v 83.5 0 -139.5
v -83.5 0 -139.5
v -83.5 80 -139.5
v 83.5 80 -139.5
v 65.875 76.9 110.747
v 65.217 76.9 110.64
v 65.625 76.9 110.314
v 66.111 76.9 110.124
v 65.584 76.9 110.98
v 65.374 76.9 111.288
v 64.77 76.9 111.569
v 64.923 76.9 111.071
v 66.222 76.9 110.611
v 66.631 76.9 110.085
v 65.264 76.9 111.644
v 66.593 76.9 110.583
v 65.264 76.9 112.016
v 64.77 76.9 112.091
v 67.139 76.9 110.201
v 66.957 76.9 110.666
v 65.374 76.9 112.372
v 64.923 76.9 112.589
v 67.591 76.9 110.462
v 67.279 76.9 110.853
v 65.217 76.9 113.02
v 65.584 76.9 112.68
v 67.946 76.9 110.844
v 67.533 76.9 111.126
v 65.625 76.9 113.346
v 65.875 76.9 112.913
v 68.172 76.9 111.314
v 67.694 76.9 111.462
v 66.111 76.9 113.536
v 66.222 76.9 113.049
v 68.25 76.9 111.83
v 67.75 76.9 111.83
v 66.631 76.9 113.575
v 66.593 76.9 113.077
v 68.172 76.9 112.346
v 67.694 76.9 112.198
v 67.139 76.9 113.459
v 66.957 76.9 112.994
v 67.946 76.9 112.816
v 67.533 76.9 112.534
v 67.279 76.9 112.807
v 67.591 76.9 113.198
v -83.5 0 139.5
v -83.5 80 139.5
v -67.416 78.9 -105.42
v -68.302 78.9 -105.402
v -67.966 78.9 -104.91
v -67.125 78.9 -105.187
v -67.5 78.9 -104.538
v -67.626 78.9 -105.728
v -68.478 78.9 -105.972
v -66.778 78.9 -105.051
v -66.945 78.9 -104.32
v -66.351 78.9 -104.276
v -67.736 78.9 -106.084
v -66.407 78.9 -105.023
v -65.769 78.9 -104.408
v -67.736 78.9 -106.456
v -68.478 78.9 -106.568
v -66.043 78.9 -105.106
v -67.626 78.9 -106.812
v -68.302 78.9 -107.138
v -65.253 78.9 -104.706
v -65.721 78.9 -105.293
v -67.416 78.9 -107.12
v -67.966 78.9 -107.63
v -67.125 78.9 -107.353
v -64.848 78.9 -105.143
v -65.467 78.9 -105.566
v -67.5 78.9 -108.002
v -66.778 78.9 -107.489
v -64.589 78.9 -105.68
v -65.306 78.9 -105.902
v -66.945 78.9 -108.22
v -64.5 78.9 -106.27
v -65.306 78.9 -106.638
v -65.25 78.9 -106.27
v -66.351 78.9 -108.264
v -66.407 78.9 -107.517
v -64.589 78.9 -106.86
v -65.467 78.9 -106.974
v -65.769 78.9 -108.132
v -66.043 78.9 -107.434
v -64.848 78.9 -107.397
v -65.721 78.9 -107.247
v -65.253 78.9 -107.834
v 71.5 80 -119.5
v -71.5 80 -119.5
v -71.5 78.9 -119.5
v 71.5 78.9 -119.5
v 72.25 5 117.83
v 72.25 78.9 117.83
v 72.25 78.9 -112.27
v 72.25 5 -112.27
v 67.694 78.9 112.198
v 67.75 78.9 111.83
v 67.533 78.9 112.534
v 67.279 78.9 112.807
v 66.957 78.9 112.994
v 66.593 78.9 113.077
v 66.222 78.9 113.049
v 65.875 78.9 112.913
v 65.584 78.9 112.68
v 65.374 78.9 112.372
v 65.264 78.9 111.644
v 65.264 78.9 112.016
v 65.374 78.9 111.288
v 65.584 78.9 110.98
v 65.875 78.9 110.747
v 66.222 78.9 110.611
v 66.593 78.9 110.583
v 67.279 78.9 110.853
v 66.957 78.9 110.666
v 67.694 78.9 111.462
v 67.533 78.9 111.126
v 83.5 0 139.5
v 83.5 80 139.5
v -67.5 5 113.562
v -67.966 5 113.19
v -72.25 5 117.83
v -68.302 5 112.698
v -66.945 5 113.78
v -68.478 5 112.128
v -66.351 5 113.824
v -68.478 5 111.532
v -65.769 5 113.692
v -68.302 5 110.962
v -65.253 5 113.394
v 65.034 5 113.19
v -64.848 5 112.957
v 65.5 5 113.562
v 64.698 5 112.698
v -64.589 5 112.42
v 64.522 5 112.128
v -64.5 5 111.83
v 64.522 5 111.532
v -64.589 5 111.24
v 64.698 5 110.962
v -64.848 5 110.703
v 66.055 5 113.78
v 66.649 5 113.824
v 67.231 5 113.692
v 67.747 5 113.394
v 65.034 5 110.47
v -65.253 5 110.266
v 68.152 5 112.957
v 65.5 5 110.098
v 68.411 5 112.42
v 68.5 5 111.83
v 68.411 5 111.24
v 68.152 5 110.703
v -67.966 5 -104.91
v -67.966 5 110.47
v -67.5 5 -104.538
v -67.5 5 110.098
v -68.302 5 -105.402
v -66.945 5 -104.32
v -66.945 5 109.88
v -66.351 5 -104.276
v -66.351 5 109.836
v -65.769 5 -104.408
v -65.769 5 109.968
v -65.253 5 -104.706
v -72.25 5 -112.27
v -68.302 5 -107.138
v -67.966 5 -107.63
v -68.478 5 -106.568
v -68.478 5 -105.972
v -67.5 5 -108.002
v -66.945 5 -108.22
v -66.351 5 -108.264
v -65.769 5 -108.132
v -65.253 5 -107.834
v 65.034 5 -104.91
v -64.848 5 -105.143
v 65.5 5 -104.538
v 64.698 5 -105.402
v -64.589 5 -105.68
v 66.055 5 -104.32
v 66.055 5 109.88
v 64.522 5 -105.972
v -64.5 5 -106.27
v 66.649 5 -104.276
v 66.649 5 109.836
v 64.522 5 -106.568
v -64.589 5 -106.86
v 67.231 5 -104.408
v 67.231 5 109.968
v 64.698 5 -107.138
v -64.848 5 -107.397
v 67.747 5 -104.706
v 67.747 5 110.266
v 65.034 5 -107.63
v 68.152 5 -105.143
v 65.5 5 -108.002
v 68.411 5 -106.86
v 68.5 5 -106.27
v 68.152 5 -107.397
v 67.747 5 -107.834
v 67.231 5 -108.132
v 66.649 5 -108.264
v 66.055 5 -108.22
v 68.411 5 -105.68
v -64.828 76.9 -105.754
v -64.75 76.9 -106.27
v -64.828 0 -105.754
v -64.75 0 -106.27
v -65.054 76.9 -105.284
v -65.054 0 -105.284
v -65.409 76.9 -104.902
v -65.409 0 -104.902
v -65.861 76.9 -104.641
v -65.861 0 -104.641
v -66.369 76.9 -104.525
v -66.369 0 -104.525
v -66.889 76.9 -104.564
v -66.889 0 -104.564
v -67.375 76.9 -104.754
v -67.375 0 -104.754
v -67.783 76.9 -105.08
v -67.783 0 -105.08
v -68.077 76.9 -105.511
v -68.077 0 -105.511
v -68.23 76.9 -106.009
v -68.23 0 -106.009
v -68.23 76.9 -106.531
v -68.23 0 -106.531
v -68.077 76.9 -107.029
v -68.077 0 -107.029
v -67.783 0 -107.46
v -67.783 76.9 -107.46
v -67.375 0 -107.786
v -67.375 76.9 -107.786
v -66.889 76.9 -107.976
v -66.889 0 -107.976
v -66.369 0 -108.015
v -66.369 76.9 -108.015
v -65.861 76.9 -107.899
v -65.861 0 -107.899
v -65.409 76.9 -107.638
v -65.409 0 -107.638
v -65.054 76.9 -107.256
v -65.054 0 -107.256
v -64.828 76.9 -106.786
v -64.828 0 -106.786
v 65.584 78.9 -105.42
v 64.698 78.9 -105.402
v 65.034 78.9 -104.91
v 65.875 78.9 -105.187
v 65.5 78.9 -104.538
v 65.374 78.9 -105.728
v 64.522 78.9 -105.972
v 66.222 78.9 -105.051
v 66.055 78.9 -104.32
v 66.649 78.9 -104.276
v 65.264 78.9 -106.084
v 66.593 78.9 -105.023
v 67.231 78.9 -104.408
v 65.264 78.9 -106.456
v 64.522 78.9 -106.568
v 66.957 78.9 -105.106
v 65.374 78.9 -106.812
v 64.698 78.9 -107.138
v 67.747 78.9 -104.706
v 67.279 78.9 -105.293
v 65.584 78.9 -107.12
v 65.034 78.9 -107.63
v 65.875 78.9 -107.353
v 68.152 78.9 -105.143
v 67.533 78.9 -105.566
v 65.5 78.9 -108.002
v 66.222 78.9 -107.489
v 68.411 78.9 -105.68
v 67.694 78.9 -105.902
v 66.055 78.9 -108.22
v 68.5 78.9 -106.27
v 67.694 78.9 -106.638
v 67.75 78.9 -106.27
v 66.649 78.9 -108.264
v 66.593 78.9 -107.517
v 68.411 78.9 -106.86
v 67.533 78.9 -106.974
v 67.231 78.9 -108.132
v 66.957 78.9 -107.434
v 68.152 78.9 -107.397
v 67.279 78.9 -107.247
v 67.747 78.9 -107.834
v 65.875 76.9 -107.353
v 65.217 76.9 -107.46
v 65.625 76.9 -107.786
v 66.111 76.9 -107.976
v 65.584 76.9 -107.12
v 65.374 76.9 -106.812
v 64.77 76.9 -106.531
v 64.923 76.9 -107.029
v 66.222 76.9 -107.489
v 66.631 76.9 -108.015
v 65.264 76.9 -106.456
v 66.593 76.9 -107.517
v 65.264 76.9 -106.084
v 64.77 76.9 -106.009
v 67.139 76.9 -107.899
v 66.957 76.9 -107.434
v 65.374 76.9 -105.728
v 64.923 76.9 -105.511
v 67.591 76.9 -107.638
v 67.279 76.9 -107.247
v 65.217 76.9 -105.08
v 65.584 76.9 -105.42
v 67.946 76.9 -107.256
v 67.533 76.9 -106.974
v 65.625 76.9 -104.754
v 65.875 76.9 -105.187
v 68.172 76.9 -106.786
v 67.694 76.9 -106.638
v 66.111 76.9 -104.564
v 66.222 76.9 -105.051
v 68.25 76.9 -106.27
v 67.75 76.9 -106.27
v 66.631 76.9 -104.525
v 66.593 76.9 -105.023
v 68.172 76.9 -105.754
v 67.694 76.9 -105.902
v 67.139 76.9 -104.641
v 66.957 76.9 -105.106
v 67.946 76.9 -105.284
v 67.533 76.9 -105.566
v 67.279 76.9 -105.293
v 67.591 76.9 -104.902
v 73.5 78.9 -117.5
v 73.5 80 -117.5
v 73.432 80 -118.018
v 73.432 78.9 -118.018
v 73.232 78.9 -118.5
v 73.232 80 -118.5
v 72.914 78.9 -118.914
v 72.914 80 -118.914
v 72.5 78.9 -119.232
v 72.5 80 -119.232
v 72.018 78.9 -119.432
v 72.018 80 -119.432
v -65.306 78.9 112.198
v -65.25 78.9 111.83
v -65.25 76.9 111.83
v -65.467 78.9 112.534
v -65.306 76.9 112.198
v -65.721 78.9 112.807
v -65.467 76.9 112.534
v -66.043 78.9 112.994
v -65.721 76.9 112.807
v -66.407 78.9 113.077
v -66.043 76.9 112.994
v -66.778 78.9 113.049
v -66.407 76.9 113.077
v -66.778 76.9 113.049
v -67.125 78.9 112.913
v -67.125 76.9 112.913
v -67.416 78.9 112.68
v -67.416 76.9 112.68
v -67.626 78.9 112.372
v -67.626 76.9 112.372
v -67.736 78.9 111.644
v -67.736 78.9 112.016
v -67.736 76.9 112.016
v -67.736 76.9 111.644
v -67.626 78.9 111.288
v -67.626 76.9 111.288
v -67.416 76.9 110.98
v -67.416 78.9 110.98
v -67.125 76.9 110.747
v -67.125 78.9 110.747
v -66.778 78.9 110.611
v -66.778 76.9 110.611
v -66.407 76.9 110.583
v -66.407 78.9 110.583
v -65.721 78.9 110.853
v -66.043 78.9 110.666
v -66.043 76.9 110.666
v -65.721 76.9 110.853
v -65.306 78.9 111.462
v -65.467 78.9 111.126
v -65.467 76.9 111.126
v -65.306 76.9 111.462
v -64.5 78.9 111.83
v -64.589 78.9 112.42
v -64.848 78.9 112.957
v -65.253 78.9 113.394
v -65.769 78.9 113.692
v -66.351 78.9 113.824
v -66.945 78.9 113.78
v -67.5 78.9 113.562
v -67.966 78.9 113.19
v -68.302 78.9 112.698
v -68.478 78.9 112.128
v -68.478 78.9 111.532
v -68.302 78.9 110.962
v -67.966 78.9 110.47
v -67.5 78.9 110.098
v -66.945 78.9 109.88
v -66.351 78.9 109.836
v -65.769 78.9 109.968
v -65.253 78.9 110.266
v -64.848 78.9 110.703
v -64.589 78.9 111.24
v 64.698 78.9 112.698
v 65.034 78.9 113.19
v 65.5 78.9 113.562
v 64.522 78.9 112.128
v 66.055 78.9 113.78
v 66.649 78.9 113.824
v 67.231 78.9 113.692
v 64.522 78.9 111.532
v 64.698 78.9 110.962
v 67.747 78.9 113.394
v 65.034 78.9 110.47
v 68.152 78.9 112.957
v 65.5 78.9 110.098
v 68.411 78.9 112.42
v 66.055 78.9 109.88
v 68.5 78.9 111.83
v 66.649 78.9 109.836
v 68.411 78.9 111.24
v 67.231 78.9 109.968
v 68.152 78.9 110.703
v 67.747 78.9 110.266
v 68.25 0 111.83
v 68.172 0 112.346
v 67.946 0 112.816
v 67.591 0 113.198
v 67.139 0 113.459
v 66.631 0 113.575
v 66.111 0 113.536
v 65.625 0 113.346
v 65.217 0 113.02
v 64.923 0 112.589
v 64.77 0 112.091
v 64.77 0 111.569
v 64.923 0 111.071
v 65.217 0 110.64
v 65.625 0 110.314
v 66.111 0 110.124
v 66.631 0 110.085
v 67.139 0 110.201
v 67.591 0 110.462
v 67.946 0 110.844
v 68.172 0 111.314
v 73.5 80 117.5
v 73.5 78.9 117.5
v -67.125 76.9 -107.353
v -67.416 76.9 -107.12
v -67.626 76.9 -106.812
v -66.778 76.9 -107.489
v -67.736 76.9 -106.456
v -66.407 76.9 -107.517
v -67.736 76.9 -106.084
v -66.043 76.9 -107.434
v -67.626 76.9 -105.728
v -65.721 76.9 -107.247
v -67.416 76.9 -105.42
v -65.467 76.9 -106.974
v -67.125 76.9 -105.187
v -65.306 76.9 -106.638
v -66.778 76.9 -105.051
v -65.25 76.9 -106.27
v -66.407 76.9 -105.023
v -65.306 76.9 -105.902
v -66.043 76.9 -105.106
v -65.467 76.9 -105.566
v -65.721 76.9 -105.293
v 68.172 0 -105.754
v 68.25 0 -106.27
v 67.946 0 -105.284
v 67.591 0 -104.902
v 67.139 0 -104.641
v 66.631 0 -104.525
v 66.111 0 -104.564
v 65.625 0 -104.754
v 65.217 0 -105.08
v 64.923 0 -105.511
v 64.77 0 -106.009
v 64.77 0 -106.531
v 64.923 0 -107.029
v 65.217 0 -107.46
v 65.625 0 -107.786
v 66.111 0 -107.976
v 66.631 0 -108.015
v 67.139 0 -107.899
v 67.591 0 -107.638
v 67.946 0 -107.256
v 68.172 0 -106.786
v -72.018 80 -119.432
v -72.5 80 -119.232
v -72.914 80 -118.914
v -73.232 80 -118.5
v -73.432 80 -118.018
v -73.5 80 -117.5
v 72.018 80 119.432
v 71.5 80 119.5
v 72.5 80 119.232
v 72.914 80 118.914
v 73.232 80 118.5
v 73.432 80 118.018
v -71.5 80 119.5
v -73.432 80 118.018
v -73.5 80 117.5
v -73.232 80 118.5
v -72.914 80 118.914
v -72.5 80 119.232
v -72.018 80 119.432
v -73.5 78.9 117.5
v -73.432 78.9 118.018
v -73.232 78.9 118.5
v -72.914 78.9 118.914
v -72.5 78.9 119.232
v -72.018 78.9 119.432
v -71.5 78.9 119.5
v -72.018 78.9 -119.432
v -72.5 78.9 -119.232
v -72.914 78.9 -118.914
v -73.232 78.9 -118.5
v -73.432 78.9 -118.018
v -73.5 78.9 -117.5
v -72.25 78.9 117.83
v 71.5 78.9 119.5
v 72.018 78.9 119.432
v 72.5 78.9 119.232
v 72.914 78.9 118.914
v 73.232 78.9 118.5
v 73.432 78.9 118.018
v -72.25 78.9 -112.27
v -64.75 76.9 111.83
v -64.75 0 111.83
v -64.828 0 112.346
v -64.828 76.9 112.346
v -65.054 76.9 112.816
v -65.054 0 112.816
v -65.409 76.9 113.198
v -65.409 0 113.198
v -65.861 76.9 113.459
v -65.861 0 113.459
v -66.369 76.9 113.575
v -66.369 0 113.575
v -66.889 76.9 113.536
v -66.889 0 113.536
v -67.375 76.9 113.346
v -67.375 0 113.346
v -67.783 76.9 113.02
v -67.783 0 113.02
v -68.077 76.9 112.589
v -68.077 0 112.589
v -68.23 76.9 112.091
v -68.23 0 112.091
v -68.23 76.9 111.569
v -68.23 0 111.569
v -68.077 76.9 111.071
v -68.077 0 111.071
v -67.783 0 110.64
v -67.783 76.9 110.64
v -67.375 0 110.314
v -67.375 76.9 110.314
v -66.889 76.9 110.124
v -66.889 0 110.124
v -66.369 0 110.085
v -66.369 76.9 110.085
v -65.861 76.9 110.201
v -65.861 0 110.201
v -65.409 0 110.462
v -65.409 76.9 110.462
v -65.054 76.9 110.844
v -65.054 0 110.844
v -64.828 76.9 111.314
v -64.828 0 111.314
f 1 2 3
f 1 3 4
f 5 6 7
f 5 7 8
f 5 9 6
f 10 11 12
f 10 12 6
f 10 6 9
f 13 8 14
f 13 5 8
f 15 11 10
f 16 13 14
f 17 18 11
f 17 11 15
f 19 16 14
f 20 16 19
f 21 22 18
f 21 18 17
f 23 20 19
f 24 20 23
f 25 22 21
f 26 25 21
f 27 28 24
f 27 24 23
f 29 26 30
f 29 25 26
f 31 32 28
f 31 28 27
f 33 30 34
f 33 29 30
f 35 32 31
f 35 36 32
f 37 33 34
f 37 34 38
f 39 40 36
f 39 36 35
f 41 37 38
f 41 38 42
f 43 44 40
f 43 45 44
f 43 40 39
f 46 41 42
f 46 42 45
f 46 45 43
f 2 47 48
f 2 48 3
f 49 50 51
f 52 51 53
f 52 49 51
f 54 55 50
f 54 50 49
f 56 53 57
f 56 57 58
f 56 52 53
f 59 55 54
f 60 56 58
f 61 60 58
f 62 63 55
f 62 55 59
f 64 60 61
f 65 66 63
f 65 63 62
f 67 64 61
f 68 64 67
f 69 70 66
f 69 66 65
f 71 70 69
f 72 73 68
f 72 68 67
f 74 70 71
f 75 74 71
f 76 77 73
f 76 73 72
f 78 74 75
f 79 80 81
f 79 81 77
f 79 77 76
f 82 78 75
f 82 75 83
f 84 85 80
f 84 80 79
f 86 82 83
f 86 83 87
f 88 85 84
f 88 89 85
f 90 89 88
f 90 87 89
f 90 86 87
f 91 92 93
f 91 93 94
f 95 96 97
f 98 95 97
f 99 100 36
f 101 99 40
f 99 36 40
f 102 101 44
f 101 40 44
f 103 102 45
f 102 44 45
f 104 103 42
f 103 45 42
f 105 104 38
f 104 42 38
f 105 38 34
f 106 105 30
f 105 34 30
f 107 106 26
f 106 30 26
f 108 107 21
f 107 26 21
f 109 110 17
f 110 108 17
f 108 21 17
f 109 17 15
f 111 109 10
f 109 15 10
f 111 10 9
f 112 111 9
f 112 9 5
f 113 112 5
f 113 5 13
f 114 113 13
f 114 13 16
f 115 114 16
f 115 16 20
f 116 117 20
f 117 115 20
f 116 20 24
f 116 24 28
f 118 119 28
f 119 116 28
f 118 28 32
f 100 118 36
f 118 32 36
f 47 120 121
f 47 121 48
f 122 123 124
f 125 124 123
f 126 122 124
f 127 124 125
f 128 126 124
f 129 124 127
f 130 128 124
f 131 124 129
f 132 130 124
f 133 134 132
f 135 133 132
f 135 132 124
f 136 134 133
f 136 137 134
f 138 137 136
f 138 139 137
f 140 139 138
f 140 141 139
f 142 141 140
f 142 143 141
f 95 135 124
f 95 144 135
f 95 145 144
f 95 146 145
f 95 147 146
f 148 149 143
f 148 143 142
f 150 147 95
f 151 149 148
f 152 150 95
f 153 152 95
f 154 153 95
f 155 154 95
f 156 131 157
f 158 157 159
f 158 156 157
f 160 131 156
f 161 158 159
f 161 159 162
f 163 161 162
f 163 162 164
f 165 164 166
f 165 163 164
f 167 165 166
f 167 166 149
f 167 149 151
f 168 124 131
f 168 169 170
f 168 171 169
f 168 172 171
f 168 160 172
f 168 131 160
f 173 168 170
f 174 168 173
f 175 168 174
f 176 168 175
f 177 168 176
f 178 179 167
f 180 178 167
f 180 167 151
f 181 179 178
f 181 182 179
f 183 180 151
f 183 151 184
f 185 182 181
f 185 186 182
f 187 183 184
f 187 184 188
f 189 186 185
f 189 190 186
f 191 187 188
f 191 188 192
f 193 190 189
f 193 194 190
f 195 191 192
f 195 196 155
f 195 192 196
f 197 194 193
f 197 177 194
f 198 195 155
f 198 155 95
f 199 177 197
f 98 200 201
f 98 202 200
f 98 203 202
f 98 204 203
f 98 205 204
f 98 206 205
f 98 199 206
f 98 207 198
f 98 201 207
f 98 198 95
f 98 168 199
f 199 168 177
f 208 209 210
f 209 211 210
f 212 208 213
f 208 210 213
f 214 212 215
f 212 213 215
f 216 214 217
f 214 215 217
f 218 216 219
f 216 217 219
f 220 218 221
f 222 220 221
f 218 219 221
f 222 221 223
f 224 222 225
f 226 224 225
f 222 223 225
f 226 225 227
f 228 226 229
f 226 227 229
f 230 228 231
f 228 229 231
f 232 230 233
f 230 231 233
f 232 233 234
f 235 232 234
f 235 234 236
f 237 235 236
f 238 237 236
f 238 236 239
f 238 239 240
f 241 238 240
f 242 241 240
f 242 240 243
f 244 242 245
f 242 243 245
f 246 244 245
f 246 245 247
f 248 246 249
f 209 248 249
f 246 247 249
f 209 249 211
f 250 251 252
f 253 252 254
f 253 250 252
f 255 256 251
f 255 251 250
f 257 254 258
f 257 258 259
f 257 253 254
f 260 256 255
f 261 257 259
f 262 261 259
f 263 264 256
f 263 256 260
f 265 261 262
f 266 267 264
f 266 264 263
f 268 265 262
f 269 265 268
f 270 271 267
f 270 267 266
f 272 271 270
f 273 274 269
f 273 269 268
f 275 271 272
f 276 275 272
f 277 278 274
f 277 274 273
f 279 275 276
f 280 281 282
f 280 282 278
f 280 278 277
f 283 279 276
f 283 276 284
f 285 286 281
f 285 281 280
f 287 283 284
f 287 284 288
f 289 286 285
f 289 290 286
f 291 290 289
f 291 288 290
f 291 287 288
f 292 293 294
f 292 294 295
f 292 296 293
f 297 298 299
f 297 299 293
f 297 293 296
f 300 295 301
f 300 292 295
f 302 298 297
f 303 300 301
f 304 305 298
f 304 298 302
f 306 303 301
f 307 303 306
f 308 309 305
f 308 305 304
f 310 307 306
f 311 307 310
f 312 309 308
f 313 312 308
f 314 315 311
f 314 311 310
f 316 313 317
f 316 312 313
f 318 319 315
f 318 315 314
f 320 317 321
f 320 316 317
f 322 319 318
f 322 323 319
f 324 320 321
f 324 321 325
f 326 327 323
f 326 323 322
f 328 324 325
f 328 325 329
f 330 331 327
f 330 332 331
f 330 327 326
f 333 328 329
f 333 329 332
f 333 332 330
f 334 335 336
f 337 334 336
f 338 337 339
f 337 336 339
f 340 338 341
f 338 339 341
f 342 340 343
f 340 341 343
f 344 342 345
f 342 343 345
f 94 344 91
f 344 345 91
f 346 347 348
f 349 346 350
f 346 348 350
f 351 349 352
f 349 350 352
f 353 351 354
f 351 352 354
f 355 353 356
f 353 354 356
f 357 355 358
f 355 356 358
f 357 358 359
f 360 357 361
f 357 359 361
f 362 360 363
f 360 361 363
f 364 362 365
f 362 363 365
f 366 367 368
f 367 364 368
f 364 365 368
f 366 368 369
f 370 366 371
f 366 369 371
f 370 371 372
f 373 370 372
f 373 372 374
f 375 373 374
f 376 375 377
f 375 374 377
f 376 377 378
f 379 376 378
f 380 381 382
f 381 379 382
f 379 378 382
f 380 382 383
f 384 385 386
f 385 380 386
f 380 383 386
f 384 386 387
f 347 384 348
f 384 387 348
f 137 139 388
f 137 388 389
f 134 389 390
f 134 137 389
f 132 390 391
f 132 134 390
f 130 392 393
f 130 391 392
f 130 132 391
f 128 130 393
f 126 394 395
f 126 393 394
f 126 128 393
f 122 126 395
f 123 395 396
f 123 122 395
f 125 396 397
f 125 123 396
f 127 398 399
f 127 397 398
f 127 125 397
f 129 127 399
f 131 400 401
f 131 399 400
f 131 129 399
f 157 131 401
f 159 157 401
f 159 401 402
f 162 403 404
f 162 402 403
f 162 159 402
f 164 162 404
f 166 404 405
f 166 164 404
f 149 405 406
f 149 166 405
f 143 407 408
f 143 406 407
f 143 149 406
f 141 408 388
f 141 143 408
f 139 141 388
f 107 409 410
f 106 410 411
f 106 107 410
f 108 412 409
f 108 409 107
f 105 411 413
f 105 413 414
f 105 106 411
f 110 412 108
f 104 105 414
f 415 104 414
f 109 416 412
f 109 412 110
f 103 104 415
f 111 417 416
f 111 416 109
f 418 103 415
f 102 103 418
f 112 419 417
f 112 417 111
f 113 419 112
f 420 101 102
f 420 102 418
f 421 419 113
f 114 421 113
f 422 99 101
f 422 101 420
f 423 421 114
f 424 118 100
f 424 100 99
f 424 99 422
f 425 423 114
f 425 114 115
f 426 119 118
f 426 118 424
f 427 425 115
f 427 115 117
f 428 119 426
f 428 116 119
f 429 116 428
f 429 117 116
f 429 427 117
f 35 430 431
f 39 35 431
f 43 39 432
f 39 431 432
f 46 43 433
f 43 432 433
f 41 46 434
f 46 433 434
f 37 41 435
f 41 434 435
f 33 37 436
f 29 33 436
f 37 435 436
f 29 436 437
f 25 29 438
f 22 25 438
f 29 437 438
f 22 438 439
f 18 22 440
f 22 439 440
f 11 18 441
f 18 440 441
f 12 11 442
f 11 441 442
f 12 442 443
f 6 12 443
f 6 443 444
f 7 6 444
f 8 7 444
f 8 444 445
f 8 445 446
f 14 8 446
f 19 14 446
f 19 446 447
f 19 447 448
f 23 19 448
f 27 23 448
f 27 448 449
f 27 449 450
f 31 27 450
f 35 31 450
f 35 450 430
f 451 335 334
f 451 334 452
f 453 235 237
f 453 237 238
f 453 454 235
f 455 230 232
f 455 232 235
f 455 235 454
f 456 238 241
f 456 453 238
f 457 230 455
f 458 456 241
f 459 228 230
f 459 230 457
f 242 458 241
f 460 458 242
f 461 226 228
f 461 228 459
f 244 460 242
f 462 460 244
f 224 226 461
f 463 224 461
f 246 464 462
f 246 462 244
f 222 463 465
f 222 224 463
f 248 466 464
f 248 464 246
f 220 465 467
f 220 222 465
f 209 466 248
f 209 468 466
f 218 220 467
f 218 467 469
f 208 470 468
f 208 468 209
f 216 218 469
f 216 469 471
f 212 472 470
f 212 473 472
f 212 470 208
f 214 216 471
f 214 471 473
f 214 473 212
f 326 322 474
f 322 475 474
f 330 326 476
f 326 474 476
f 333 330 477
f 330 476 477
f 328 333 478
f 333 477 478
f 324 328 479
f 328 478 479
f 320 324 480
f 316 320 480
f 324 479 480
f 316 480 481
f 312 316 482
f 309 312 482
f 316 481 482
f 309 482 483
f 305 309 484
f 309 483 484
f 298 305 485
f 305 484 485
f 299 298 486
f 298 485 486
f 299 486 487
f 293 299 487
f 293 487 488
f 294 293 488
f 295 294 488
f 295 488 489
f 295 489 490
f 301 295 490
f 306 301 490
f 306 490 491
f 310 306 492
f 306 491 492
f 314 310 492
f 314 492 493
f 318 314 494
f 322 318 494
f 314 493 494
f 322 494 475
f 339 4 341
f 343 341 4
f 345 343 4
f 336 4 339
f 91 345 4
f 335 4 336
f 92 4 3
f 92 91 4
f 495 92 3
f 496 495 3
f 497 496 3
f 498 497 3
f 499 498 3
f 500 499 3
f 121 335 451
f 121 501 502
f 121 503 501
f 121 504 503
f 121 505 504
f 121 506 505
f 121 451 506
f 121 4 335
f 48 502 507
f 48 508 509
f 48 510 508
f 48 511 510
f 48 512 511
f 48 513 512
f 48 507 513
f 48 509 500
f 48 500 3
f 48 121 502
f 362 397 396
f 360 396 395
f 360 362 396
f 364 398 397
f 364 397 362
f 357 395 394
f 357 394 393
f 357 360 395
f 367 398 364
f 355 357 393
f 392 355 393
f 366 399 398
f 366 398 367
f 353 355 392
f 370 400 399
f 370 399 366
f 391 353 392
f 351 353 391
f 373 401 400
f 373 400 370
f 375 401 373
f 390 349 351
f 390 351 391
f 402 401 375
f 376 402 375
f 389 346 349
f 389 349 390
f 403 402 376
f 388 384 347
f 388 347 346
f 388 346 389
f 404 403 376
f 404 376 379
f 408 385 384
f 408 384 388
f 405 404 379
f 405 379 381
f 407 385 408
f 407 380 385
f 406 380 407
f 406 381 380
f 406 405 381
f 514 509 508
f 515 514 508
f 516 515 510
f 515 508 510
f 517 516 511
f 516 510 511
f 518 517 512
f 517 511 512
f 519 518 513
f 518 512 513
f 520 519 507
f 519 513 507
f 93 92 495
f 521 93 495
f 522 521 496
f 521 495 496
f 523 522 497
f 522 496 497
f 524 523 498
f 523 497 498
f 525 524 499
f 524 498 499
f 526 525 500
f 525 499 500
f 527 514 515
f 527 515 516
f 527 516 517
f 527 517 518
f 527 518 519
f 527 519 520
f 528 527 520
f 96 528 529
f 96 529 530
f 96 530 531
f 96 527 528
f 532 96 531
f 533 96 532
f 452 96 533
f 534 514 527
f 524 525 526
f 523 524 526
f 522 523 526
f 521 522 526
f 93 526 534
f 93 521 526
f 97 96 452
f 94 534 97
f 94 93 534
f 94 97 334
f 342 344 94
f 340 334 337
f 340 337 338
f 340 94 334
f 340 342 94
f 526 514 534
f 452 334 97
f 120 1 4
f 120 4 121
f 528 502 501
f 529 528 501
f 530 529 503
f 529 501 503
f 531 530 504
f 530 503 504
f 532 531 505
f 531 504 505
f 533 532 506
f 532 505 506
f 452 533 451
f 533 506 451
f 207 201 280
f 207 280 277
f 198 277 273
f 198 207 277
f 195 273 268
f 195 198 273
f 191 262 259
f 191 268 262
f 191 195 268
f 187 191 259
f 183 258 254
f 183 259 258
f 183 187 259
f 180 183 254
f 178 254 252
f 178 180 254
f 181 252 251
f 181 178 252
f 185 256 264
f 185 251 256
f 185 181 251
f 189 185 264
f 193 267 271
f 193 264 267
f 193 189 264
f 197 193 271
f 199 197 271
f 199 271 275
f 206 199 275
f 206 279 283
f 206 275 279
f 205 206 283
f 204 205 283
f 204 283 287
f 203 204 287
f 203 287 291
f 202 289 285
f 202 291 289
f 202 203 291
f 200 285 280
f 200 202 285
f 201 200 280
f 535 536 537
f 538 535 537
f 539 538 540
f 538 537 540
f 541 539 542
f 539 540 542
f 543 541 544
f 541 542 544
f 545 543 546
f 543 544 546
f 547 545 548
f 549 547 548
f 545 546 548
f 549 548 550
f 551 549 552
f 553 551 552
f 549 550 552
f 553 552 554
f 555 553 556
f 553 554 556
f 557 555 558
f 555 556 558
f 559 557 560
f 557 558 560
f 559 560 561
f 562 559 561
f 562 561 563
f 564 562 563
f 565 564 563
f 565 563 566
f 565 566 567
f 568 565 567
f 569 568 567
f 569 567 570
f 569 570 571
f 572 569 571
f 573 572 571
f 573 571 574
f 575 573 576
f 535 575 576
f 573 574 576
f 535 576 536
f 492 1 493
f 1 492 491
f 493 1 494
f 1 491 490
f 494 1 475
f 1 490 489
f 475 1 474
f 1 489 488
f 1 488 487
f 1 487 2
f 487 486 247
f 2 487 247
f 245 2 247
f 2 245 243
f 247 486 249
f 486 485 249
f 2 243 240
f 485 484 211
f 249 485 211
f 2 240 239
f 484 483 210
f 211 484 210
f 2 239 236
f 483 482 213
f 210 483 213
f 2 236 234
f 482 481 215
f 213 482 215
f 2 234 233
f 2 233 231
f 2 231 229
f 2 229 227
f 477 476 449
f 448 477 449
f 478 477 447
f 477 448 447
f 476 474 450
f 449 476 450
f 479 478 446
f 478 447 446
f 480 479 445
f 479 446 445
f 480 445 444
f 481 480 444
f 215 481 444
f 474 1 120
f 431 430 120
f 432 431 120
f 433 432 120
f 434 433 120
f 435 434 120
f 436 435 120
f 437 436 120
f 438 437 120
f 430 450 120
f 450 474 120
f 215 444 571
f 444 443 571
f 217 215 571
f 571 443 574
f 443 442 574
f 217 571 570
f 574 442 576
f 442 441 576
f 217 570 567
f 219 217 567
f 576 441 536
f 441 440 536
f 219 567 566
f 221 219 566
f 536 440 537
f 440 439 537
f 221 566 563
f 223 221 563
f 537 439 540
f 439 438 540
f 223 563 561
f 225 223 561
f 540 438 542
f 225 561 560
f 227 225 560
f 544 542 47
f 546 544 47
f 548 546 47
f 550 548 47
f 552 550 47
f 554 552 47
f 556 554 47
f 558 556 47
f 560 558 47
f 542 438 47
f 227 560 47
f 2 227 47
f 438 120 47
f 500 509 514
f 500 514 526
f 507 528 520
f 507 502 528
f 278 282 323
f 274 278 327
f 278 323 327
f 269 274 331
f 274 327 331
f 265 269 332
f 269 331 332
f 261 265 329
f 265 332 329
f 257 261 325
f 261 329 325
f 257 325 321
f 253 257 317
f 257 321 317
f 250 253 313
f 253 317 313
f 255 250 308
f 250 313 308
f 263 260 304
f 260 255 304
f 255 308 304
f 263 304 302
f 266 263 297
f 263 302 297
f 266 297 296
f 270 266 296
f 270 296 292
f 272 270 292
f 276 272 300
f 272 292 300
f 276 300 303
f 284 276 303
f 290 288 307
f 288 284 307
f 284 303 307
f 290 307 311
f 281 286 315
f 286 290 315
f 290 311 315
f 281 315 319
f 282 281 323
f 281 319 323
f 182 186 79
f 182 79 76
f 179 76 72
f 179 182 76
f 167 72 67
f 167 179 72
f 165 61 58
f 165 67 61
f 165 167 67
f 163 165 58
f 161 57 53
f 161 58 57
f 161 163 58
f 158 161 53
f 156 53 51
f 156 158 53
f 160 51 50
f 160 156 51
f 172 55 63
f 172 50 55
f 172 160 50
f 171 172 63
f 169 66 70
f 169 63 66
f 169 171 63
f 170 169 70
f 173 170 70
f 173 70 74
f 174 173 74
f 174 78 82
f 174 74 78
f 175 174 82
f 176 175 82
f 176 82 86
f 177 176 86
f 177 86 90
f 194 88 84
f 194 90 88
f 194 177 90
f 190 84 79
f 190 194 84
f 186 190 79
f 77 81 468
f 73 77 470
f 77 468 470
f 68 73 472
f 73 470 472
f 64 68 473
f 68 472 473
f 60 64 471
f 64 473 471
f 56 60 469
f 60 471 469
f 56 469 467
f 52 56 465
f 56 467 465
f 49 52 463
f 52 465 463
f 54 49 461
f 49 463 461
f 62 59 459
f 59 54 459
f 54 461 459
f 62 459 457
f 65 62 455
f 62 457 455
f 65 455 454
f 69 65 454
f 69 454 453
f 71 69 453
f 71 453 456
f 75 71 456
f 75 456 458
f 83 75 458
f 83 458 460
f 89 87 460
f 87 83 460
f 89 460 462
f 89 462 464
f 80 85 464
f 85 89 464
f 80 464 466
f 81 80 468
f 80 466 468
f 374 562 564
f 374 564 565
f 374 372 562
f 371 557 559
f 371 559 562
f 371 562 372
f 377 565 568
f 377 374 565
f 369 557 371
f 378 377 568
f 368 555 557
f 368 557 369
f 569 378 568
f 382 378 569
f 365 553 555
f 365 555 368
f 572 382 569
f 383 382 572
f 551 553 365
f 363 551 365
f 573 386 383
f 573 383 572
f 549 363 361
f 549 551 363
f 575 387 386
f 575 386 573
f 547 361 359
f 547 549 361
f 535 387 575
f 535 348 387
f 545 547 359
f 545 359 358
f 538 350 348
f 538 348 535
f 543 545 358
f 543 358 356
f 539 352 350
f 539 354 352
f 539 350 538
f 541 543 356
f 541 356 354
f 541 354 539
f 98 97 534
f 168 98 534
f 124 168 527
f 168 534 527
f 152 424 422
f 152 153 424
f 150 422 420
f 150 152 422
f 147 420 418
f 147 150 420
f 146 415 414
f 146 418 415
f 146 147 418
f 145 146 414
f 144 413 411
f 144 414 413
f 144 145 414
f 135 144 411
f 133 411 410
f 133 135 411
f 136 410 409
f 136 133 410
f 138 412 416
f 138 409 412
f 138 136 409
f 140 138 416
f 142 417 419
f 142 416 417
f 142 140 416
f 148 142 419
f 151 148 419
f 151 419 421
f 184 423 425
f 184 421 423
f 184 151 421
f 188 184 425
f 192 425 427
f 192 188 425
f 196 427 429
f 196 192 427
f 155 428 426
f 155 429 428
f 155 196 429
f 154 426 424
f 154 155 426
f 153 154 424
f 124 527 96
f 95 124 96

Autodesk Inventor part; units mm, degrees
ref_plane "YZ Plane" through (0, 0, 0) normal (1, 0, 0) x (0, 1, 0)
ref_plane "XZ Plane" through (0, 0, 0) normal (0, 1, 0) x (-1, 0, 0)
ref_plane "XY Plane" through (0, 0, 0) normal (0, 0, 1) x (1, 0, 0)
sketch "Sketch1" plane through (0, 0, 0) normal (0, 1, 0) x (-1, 0, 0)
  line L0 (-83.5, 139.5) -> (83.5, 139.5)
  line L1 (83.5, 139.5) -> (83.5, -139.5)
  line L2 (83.5, -139.5) -> (-83.5, -139.5)
  line L3 (-83.5, -139.5) -> (-83.5, 139.5)
  line L4 (-83.5, 139.5) -> (83.5, -139.5) construction
  line L5 (83.5, 139.5) -> (-83.5, -139.5) construction
  point P0 (0, 0)
  dimension "d0" = 167
  dimension "d1" = 279
extrude "Extrusion1" add sketch "Sketch1" along normal blind 80
sketch "Sketch2" plane through (0, 80, 0) normal (0, 1, 0) x (1, 0, 0)
  line L0 (71.5, -119.5) -> (-71.5, -119.5)
  line L1 (-73.5, -117.5) -> (-73.5, 117.5)
  line L2 (-71.5, 119.5) -> (71.5, 119.5)
  line L3 (73.5, 117.5) -> (73.5, -117.5)
  line L4 (73.5, -119.5) -> (-73.5, 119.5) construction
  line L5 (-73.5, -119.5) -> (73.5, 119.5) construction
  arc A0 (-73.5, -117.5) -> (-71.5, -119.5) centre (-71.5, -117.5) ccw
  arc A1 (-71.5, 119.5) -> (-73.5, 117.5) centre (-71.5, 117.5) ccw
  arc A2 (73.5, 117.5) -> (71.5, 119.5) centre (71.5, 117.5) ccw
  arc A3 (71.5, -119.5) -> (73.5, -117.5) centre (71.5, -117.5) ccw
  point P0 (0, 0)
  dimension "d4" = 147
  dimension "d5" = 239
  dimension "d6" = 2
extrude "Extrusion2" cut sketch "Sketch2" against normal blind 1.1
sketch "Sketch3" plane through (0, 78.9, 0) normal (0, 1, 0) x (1, 0, 0)
  line L0 (-73.5, -117.5) -> (-73.5, 117.5) projected
  line L1 (71.5, -119.5) -> (-71.5, -119.5) projected
  line L2 (-72.25, -117.83) -> (72.25, -117.83)
  line L3 (72.25, -117.83) -> (72.25, 112.27)
  line L4 (72.25, 112.27) -> (-72.25, 112.27)
  line L5 (-72.25, 112.27) -> (-72.25, -117.83)
  point P0 (0, 0)
  dimension "d9" = 1.25
  dimension "d10" = 1.67
  dimension "d11" = 144.5
  dimension "d12" = 230.1
extrude "Extrusion3" cut sketch "Sketch3" against normal blind 73.9
sketch "Sketch4" plane through (0, 5, 0) normal (0, 1, 0) x (1, 0, 0)
  circle A0 centre (-66.5, -111.83) radius 2
  line L0 (72.25, -117.83) -> (-72.25, -117.83) projected
  line L1 (-72.25, -117.83) -> (-72.25, 112.27) projected
  circle A1 centre (66.5, -111.83) radius 2
  line L2 (72.25, 112.27) -> (72.25, -117.83) projected
  circle A2 centre (-66.5, 106.27) radius 2
  line L3 (-72.25, 112.27) -> (72.25, 112.27) projected
  circle A3 centre (66.5, 106.27) radius 2
  point P0 (0, 0)
  dimension "d15" = 4
  dimension "d16" = 6
  dimension "d17" = 5.75
  dimension "d18" = 4
  dimension "d19" = 6
  dimension "d20" = 5.75
  dimension "d21" = 4
  dimension "d22" = 5.75
  dimension "d23" = 6
  dimension "d24" = 4
  dimension "d25" = 6
  dimension "d26" = 5.75
extrude "Extrusion4" add sketch "Sketch4" along normal blind 73.9 contours A0 | A1 | A2 | A3
sketch "Sketch5" plane through (0, 5, 0) normal (0, 1, 0) x (1, 0, 0)
  circle A0 centre (-66.5, -111.83) radius 2 projected
  circle A1 centre (-66.5, -111.83) radius 1.25
  circle A2 centre (-66.5, 106.27) radius 2 projected
  circle A3 centre (-66.5, 106.27) radius 1.25
  circle A4 centre (66.5, 106.27) radius 2 projected
  circle A5 centre (66.5, 106.27) radius 1.25
  circle A6 centre (66.5, -111.83) radius 1.25
  point P0 (0, 0)
  dimension "d29" = 2.5
  dimension "d30" = 2.5
  dimension "d31" = 2.5
  dimension "d32" = 2.5
extrude "Extrusion5" cut sketch "Sketch5" along normal blind 73.9 and the other way blind 5 contours A1 | A3 | A5 | A6
sketch "Sketch6" plane through (0, 0, 0) normal (0, -1, 0) x (1, 0, 0)
  circle A0 centre (-66.5, -106.27) radius 1.25 projected
  circle A1 centre (-66.5, -106.27) radius 1.75
  circle A2 centre (-66.5, 111.83) radius 1.25 projected
  circle A3 centre (-66.5, 111.83) radius 1.75
  circle A4 centre (66.5, 111.83) radius 1.25 projected
  circle A5 centre (66.5, 111.83) radius 1.75
  circle A6 centre (66.5, -106.27) radius 1.25 projected
  circle A7 centre (66.5, -106.27) radius 1.75
  point P0 (0, 0)
  dimension "d37" = 3.5
  dimension "d38" = 3.5
  dimension "d39" = 3.5
  dimension "d40" = 3.5
extrude "Extrusion6" cut sketch "Sketch6" against normal blind 76.9 contours A0 | A1 | A2 | A3 | A4 | A5 | A6 | A7
properties part number "Enclosure"
